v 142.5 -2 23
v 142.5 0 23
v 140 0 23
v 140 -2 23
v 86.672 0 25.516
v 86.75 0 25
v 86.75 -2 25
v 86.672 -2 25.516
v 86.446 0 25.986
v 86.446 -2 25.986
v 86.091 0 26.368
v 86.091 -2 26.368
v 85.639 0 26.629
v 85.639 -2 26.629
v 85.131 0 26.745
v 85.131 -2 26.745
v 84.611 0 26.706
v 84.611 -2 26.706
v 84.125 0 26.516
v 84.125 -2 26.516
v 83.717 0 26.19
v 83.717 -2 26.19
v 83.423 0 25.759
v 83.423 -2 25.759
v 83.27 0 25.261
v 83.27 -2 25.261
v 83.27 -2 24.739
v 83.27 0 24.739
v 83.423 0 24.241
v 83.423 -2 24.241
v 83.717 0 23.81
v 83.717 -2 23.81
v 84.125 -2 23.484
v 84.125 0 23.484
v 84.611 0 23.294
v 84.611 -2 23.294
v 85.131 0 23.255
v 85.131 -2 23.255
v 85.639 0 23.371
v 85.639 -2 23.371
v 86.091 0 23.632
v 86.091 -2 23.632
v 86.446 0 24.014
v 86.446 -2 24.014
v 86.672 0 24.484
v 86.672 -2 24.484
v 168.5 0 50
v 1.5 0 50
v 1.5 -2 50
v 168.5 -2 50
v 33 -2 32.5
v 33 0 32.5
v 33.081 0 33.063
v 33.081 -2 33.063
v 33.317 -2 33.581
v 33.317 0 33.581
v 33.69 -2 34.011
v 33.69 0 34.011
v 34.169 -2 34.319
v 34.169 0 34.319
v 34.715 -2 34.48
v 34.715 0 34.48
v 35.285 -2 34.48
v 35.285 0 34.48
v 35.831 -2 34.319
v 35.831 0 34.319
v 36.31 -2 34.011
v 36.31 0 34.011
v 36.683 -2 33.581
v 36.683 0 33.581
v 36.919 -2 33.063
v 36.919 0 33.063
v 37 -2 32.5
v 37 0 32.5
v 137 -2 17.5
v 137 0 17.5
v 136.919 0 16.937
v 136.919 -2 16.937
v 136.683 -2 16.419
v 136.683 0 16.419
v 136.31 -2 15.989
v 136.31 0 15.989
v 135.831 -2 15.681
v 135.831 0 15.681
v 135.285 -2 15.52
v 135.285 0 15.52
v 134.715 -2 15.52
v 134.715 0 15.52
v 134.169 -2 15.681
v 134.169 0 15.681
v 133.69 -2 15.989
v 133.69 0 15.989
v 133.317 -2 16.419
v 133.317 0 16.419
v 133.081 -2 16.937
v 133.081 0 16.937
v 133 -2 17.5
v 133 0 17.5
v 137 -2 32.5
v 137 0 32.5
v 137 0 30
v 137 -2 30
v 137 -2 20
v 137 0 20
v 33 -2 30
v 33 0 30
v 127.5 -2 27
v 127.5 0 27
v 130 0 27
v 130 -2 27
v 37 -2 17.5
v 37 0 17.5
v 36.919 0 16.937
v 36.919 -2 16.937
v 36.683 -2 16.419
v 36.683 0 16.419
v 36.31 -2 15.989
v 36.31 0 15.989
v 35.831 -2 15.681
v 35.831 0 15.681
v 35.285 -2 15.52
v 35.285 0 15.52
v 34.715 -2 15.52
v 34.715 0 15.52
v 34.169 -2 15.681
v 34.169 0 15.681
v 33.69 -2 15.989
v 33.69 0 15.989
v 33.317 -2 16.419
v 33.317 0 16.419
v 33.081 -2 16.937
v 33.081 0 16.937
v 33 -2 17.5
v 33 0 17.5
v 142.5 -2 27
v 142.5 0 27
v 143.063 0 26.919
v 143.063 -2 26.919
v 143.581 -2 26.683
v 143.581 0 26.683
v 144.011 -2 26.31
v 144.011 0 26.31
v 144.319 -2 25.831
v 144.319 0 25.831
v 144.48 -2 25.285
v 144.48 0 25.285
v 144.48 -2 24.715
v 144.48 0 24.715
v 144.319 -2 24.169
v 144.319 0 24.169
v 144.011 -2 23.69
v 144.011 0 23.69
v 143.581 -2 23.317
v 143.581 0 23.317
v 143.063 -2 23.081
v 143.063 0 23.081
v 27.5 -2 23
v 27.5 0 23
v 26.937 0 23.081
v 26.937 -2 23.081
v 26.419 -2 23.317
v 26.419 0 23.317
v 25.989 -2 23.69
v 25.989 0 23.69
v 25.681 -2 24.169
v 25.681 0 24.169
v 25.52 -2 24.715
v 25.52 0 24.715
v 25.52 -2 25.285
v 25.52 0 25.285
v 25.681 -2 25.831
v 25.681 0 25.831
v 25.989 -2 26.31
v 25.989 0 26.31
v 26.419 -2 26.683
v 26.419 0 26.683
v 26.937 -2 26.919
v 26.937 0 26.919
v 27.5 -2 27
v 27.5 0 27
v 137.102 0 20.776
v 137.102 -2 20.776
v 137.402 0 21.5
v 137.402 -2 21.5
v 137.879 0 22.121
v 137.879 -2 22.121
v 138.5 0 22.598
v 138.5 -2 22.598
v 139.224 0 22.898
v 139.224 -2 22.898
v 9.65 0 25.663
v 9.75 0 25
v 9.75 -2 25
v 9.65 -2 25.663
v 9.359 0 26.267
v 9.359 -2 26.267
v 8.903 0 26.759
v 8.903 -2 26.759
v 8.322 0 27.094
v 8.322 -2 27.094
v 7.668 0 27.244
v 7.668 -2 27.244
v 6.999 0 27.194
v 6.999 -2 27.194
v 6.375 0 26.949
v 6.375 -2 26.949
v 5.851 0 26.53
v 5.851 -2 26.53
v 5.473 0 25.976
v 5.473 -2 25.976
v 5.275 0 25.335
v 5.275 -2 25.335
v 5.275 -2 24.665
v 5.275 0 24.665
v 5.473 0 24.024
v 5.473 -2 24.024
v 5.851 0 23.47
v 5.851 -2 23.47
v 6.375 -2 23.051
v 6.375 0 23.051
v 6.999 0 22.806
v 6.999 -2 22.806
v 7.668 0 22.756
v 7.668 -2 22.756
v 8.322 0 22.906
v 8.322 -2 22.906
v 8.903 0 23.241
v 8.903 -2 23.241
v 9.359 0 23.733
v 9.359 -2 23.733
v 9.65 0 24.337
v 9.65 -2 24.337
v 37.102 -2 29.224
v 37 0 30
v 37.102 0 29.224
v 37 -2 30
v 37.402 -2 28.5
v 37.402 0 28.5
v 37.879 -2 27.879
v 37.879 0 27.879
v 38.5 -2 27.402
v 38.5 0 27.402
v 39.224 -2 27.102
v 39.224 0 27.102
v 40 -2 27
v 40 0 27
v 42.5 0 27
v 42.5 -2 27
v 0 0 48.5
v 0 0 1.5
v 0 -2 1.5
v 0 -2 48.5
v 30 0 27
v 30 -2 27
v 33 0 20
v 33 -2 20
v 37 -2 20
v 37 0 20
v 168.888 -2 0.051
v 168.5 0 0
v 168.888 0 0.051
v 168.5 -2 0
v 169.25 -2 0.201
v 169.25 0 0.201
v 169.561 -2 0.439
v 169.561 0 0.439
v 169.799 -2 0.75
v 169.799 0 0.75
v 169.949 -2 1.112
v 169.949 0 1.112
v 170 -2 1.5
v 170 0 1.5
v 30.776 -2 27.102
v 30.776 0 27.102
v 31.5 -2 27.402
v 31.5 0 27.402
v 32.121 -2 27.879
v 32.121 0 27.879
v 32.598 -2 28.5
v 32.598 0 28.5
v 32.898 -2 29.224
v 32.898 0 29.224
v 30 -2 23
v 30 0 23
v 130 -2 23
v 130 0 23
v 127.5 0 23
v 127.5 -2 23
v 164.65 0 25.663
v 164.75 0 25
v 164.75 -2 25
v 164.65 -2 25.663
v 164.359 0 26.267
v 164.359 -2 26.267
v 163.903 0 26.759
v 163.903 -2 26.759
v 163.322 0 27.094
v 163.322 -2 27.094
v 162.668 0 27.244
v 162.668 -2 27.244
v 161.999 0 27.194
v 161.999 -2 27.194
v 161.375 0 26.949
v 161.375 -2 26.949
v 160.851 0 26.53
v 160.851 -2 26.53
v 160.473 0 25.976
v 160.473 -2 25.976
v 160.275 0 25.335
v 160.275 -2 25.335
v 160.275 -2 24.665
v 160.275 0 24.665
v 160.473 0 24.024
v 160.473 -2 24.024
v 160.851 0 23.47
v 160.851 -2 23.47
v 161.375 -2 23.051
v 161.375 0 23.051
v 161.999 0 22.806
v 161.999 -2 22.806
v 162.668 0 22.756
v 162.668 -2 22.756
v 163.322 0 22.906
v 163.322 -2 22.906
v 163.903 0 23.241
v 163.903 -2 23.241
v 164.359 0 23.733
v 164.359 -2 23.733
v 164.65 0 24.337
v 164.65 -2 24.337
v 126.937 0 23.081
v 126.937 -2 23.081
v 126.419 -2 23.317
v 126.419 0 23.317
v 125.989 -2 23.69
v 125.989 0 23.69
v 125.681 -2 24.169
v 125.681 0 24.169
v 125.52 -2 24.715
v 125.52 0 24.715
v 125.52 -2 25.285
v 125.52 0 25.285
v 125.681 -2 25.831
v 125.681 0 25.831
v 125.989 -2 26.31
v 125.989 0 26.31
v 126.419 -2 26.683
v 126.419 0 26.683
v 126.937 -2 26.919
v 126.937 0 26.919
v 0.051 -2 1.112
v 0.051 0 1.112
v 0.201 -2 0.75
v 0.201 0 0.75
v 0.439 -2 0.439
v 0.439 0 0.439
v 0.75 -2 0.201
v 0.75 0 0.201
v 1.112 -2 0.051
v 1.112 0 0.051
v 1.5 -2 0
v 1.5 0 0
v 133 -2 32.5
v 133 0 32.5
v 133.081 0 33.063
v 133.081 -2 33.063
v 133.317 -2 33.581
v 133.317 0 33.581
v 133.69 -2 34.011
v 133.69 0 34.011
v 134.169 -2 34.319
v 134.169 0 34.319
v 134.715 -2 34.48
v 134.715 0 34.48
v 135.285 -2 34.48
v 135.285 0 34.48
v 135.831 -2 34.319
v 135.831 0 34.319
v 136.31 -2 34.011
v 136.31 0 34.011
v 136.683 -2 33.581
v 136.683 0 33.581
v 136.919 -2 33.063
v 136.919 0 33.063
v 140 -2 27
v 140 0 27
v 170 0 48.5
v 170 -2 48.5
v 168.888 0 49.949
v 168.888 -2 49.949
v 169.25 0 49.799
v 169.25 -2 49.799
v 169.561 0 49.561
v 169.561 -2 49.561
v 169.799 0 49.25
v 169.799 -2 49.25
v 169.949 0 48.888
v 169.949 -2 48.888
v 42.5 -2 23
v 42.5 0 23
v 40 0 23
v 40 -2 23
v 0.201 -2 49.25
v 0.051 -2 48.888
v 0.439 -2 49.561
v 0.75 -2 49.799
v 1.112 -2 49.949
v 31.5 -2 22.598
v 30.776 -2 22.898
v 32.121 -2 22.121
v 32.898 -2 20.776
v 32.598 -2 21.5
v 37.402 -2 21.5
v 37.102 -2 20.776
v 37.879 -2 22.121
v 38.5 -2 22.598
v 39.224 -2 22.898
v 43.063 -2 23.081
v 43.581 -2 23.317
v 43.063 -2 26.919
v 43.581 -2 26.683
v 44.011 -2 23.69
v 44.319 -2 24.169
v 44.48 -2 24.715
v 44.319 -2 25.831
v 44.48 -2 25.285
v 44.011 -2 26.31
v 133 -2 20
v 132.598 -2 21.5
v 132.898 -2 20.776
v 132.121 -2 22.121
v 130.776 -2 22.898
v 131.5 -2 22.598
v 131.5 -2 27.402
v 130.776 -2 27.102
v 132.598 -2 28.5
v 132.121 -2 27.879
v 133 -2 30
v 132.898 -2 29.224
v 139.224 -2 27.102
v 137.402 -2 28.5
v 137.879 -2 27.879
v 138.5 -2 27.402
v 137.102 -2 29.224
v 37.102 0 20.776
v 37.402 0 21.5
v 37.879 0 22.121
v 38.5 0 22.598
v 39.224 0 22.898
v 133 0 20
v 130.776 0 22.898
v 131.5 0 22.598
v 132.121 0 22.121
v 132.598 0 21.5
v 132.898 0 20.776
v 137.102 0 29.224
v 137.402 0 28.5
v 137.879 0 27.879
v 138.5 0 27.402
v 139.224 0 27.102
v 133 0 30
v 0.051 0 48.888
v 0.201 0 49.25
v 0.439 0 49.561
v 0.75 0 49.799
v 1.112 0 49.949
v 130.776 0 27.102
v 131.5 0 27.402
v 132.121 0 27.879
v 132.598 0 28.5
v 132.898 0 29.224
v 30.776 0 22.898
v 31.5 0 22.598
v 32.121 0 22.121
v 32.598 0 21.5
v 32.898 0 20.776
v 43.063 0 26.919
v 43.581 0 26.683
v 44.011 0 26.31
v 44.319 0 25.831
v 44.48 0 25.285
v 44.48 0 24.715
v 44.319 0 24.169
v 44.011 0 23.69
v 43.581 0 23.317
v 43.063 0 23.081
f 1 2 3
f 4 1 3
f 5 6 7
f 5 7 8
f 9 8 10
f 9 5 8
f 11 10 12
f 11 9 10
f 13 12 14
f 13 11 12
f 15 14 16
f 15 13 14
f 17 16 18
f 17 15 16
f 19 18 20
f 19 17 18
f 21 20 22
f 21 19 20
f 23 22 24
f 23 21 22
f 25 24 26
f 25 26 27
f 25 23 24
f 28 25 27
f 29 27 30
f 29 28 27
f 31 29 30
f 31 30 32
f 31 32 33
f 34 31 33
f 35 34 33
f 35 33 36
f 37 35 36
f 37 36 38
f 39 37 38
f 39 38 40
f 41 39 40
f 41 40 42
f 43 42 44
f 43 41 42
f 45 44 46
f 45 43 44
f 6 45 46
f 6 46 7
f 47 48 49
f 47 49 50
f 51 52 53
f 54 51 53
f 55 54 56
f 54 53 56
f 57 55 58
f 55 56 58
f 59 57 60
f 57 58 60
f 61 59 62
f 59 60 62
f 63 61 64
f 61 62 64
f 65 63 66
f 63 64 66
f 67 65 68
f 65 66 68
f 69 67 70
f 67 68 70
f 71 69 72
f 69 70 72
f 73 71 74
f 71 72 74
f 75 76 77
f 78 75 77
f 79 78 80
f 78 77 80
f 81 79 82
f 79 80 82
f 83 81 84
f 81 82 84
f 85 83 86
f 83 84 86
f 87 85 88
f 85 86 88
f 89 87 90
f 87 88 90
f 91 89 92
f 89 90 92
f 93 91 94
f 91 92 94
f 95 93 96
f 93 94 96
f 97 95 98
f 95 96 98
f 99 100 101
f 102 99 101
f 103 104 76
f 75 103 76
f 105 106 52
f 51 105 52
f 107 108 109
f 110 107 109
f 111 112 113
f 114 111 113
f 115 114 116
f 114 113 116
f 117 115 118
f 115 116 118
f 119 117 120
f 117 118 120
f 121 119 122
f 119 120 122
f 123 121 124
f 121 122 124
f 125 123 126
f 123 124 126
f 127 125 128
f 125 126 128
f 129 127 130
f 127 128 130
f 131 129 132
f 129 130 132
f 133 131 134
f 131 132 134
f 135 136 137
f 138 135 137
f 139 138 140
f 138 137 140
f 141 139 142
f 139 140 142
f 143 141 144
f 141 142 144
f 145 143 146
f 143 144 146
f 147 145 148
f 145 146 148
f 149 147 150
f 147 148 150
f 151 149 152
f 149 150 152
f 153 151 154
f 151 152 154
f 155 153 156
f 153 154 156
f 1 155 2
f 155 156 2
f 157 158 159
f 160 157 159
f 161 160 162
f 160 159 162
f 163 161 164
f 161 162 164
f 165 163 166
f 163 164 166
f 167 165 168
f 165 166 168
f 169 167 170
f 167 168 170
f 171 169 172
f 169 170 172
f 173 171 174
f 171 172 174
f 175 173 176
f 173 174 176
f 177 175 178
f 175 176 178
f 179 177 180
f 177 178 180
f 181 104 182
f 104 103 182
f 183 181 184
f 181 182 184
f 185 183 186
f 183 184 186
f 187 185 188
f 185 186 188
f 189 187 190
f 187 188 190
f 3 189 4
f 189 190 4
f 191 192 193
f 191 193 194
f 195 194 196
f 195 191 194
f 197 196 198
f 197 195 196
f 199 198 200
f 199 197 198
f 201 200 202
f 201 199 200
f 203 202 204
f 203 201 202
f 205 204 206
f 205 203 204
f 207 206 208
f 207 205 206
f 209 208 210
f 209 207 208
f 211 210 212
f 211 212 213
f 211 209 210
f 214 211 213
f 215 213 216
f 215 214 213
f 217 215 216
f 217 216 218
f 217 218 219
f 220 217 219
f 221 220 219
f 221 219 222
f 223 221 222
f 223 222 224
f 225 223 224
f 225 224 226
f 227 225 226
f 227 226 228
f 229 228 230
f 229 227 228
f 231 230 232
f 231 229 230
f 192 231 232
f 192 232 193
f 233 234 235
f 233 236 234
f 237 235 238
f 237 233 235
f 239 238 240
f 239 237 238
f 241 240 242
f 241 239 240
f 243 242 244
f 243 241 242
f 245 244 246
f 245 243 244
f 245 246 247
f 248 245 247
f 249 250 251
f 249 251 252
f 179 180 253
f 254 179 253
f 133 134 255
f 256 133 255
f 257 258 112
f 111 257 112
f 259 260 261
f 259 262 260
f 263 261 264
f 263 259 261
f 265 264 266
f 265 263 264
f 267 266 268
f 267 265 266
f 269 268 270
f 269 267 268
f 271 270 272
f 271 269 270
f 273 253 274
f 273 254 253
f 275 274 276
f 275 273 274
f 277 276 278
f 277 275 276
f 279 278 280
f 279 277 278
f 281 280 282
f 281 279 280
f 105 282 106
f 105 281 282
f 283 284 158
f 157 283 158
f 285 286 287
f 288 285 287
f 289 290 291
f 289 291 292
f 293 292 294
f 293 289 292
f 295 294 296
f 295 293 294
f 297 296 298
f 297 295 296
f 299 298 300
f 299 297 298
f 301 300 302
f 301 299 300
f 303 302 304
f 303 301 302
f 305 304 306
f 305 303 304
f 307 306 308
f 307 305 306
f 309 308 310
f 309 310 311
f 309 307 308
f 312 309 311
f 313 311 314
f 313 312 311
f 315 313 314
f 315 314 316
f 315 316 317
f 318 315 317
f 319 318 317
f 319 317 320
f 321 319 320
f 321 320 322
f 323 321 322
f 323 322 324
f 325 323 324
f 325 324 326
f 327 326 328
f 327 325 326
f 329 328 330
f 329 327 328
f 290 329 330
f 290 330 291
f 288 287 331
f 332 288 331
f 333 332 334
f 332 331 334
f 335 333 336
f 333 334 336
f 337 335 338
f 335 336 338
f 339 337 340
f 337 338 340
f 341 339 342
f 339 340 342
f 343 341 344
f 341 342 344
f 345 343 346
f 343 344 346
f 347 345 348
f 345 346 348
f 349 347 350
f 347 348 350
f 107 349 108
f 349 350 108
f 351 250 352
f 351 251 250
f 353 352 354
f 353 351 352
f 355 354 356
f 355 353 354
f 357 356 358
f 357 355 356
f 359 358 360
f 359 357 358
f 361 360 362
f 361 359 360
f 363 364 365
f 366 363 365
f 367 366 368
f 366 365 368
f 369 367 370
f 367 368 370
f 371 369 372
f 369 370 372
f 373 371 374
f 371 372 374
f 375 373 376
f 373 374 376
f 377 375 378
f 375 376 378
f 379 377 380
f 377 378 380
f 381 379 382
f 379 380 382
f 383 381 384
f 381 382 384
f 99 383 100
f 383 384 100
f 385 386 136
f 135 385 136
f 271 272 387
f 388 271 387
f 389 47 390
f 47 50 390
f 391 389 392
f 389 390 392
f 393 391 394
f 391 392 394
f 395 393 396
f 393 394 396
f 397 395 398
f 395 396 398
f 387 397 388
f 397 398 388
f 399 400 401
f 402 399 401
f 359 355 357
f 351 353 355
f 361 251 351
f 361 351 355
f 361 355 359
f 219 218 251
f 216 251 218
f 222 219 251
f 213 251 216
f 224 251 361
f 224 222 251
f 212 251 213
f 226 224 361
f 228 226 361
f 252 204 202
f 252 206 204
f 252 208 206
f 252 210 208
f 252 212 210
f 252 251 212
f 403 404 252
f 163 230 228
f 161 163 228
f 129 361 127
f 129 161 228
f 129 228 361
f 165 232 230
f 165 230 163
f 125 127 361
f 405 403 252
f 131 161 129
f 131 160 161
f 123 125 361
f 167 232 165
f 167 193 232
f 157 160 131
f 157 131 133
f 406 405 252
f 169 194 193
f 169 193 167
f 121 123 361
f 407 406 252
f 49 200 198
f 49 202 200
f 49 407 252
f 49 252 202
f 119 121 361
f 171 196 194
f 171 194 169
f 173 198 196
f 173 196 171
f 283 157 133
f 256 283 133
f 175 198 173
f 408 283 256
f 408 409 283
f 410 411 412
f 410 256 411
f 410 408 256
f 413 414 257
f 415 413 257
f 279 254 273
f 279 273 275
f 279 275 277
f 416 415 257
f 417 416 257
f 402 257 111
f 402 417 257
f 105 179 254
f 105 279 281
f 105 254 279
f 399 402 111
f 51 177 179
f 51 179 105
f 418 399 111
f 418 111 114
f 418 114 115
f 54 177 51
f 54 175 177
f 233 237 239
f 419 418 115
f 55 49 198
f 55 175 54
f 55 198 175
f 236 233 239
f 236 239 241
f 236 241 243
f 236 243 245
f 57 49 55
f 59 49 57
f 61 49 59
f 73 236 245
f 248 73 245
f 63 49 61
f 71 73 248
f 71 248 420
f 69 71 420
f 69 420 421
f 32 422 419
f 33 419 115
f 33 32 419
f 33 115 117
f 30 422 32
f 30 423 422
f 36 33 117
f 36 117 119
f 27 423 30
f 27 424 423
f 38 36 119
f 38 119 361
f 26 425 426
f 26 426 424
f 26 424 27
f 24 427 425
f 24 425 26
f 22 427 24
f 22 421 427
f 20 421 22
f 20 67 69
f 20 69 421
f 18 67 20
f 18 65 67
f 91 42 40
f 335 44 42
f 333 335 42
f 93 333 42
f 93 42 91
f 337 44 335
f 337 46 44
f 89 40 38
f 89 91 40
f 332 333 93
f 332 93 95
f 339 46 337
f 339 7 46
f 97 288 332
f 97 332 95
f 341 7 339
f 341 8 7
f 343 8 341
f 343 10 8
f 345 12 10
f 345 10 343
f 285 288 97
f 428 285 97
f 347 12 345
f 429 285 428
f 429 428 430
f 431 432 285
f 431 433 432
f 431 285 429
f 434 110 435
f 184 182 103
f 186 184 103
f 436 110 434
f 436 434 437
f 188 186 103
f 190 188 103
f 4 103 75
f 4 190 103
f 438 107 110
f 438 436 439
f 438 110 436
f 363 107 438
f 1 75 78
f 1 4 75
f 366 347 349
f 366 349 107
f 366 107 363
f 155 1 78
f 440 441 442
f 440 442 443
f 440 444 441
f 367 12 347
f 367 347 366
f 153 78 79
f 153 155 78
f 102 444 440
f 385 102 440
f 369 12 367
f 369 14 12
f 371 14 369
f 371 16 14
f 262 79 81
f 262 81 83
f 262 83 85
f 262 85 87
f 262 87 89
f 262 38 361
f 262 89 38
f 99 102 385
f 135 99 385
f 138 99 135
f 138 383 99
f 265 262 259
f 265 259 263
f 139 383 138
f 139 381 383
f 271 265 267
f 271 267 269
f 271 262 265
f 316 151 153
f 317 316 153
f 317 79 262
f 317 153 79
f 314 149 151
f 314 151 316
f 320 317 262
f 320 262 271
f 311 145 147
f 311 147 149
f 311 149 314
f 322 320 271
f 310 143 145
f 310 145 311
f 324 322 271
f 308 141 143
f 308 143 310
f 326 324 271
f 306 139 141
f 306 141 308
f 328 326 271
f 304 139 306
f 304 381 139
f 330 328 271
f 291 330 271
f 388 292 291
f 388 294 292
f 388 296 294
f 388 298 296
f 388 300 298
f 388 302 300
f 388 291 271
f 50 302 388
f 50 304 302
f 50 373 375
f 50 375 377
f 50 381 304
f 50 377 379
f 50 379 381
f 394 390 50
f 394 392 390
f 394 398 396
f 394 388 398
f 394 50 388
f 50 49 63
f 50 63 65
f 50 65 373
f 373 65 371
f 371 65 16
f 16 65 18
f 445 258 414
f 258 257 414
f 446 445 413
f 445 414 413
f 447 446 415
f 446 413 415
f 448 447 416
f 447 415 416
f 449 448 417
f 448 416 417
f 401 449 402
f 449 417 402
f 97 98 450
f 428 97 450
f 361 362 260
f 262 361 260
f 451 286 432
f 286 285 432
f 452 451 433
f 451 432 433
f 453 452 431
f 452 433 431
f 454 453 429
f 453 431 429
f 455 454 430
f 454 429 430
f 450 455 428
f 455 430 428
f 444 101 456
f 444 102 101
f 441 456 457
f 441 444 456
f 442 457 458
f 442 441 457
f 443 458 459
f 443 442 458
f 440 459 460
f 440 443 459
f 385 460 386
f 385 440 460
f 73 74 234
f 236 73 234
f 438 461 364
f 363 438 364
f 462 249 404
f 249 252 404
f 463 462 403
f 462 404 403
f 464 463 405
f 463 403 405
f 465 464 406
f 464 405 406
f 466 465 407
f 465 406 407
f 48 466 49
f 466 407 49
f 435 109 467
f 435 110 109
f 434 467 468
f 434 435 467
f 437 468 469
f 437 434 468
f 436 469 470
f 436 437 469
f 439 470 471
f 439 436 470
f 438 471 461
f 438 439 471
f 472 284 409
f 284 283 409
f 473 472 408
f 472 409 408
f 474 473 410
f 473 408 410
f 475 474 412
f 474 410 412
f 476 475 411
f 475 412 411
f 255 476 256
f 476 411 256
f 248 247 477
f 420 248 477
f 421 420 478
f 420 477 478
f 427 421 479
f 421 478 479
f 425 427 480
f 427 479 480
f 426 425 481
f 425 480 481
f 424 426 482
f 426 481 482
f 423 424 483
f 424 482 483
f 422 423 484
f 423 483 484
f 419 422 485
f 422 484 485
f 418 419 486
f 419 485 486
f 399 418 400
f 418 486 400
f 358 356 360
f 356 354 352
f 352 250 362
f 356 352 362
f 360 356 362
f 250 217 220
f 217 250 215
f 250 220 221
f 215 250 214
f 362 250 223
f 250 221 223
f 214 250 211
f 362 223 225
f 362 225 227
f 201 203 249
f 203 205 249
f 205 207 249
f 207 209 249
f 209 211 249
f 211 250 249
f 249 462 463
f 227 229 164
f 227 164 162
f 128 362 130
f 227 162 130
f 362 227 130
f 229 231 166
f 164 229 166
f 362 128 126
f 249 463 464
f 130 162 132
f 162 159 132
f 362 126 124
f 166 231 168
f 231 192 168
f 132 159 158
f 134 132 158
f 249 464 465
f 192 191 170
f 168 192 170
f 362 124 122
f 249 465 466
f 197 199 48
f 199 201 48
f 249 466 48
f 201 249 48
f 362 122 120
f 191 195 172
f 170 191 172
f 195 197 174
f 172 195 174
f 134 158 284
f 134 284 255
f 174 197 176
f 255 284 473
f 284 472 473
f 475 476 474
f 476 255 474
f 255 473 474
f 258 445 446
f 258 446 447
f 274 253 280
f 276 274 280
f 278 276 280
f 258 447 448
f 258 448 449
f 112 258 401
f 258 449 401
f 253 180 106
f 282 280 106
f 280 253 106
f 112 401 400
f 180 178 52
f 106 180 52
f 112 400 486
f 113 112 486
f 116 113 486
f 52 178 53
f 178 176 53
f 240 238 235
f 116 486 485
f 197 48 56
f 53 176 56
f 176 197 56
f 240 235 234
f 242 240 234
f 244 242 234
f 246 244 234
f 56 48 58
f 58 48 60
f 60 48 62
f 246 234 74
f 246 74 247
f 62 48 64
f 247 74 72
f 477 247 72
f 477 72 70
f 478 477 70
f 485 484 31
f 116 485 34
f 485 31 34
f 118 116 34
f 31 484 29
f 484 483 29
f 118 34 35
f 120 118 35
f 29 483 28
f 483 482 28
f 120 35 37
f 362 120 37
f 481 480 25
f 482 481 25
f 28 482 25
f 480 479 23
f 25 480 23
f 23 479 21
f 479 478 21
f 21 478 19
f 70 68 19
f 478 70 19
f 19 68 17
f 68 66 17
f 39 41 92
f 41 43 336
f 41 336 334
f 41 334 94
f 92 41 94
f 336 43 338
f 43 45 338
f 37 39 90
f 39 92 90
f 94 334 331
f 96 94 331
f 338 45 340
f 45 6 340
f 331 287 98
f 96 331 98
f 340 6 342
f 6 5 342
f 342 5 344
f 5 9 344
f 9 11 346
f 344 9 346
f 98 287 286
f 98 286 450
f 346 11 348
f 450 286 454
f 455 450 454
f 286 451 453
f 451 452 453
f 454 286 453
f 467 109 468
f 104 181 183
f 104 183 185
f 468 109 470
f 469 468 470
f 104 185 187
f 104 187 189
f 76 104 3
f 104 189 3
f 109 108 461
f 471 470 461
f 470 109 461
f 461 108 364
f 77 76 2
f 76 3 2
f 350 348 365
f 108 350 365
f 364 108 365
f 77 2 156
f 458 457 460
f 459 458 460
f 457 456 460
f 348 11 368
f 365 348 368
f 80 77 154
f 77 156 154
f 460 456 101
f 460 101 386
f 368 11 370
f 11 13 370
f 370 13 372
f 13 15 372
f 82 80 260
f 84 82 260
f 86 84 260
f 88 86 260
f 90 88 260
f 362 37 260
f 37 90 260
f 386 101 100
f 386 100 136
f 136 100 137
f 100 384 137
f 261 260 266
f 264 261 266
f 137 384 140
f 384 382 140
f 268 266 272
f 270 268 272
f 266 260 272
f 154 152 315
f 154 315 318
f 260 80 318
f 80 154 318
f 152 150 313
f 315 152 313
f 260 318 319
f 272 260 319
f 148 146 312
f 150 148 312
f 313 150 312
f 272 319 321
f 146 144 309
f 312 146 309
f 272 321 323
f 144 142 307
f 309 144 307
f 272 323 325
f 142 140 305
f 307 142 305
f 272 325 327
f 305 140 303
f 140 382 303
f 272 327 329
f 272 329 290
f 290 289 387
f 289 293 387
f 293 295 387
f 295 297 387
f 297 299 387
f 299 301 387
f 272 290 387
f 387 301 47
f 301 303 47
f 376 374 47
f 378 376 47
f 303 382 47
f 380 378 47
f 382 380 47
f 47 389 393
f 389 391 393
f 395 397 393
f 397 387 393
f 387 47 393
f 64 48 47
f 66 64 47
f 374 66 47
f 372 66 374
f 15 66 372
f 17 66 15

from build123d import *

# Parameters (mm, degrees)
F0_W     = 170
F0_H     = 50
F0_R     = 2.25
F0_R_2   = 1.75
F1_DEPTH = 2
F2_R     = 3
F3_R     = 1.5


# Not quite as in the source:
# - a feature names something its author has since deleted; it is built from what else it names


with BuildPart() as f1:
    # F0 (on Front) → F1 (new body)
    with BuildSketch(Plane.XZ):
        with Locations((85, 25)):
            Rectangle(F0_W, F0_H)
        with Locations((7.5, 25)):
            Circle(F0_R, mode=Mode.SUBTRACT)
        with BuildLine():
            Line((27.5, 27), (33, 27))
            Line((33, 27), (33, 32.5))
            ThreePointArc((33, 32.5), (35, 34.5), (37, 32.5))
            Line((37, 32.5), (37, 27))
            Line((37, 27), (42.5, 27))
            ThreePointArc((42.5, 27), (44.5, 25), (42.5, 23))
            Line((42.5, 23), (37, 23))
            Line((37, 23), (37, 17.5))
            ThreePointArc((37, 17.5), (35, 15.5), (33, 17.5))
            Line((33, 17.5), (33, 23))
            Line((33, 23), (27.5, 23))
            ThreePointArc((27.5, 23), (25.5, 25), (27.5, 27))
        make_face(mode=Mode.SUBTRACT)
        with Locations((85, 25)):
            Circle(F0_R_2, mode=Mode.SUBTRACT)
        with BuildLine():
            ThreePointArc((127.5, 23), (125.5, 25), (127.5, 27))
            Line((127.5, 27), (133, 27))
            Line((133, 27), (133, 32.5))
            ThreePointArc((133, 32.5), (135, 34.5), (137, 32.5))
            Line((137, 32.5), (137, 27))
            Line((137, 27), (142.5, 27))
            ThreePointArc((142.5, 27), (144.5, 25), (142.5, 23))
            Line((142.5, 23), (137, 23))
            Line((137, 23), (137, 17.5))
            ThreePointArc((137, 17.5), (135, 15.5), (133, 17.5))
            Line((133, 17.5), (133, 23))
            Line((133, 23), (127.5, 23))
        make_face(mode=Mode.SUBTRACT)
        with Locations((162.5, 25)):
            Circle(F0_R, mode=Mode.SUBTRACT)
    extrude(amount=F1_DEPTH)

    # F2
    f2_edges = [f1.edges().sort_by_distance(p)[0] for p in [
        (33, -1, 27),
        (37, -1, 27),
        (37, -1, 23),
        (33, -1, 23),
        (133, -1, 27),
        (133, -1, 23),
        (137, -1, 27),
        (137, -1, 23),
    ]]
    fillet(f2_edges, radius=F2_R)

    # F3
    f3_edges = [f1.edges().sort_by_distance(p)[0] for p in [
        (0, -1, 50),
        (0, -1, 0),
        (170, -1, 50),
        (170, -1, 0),
    ]]
    fillet(f3_edges, radius=F3_R)


solid = f1.part
